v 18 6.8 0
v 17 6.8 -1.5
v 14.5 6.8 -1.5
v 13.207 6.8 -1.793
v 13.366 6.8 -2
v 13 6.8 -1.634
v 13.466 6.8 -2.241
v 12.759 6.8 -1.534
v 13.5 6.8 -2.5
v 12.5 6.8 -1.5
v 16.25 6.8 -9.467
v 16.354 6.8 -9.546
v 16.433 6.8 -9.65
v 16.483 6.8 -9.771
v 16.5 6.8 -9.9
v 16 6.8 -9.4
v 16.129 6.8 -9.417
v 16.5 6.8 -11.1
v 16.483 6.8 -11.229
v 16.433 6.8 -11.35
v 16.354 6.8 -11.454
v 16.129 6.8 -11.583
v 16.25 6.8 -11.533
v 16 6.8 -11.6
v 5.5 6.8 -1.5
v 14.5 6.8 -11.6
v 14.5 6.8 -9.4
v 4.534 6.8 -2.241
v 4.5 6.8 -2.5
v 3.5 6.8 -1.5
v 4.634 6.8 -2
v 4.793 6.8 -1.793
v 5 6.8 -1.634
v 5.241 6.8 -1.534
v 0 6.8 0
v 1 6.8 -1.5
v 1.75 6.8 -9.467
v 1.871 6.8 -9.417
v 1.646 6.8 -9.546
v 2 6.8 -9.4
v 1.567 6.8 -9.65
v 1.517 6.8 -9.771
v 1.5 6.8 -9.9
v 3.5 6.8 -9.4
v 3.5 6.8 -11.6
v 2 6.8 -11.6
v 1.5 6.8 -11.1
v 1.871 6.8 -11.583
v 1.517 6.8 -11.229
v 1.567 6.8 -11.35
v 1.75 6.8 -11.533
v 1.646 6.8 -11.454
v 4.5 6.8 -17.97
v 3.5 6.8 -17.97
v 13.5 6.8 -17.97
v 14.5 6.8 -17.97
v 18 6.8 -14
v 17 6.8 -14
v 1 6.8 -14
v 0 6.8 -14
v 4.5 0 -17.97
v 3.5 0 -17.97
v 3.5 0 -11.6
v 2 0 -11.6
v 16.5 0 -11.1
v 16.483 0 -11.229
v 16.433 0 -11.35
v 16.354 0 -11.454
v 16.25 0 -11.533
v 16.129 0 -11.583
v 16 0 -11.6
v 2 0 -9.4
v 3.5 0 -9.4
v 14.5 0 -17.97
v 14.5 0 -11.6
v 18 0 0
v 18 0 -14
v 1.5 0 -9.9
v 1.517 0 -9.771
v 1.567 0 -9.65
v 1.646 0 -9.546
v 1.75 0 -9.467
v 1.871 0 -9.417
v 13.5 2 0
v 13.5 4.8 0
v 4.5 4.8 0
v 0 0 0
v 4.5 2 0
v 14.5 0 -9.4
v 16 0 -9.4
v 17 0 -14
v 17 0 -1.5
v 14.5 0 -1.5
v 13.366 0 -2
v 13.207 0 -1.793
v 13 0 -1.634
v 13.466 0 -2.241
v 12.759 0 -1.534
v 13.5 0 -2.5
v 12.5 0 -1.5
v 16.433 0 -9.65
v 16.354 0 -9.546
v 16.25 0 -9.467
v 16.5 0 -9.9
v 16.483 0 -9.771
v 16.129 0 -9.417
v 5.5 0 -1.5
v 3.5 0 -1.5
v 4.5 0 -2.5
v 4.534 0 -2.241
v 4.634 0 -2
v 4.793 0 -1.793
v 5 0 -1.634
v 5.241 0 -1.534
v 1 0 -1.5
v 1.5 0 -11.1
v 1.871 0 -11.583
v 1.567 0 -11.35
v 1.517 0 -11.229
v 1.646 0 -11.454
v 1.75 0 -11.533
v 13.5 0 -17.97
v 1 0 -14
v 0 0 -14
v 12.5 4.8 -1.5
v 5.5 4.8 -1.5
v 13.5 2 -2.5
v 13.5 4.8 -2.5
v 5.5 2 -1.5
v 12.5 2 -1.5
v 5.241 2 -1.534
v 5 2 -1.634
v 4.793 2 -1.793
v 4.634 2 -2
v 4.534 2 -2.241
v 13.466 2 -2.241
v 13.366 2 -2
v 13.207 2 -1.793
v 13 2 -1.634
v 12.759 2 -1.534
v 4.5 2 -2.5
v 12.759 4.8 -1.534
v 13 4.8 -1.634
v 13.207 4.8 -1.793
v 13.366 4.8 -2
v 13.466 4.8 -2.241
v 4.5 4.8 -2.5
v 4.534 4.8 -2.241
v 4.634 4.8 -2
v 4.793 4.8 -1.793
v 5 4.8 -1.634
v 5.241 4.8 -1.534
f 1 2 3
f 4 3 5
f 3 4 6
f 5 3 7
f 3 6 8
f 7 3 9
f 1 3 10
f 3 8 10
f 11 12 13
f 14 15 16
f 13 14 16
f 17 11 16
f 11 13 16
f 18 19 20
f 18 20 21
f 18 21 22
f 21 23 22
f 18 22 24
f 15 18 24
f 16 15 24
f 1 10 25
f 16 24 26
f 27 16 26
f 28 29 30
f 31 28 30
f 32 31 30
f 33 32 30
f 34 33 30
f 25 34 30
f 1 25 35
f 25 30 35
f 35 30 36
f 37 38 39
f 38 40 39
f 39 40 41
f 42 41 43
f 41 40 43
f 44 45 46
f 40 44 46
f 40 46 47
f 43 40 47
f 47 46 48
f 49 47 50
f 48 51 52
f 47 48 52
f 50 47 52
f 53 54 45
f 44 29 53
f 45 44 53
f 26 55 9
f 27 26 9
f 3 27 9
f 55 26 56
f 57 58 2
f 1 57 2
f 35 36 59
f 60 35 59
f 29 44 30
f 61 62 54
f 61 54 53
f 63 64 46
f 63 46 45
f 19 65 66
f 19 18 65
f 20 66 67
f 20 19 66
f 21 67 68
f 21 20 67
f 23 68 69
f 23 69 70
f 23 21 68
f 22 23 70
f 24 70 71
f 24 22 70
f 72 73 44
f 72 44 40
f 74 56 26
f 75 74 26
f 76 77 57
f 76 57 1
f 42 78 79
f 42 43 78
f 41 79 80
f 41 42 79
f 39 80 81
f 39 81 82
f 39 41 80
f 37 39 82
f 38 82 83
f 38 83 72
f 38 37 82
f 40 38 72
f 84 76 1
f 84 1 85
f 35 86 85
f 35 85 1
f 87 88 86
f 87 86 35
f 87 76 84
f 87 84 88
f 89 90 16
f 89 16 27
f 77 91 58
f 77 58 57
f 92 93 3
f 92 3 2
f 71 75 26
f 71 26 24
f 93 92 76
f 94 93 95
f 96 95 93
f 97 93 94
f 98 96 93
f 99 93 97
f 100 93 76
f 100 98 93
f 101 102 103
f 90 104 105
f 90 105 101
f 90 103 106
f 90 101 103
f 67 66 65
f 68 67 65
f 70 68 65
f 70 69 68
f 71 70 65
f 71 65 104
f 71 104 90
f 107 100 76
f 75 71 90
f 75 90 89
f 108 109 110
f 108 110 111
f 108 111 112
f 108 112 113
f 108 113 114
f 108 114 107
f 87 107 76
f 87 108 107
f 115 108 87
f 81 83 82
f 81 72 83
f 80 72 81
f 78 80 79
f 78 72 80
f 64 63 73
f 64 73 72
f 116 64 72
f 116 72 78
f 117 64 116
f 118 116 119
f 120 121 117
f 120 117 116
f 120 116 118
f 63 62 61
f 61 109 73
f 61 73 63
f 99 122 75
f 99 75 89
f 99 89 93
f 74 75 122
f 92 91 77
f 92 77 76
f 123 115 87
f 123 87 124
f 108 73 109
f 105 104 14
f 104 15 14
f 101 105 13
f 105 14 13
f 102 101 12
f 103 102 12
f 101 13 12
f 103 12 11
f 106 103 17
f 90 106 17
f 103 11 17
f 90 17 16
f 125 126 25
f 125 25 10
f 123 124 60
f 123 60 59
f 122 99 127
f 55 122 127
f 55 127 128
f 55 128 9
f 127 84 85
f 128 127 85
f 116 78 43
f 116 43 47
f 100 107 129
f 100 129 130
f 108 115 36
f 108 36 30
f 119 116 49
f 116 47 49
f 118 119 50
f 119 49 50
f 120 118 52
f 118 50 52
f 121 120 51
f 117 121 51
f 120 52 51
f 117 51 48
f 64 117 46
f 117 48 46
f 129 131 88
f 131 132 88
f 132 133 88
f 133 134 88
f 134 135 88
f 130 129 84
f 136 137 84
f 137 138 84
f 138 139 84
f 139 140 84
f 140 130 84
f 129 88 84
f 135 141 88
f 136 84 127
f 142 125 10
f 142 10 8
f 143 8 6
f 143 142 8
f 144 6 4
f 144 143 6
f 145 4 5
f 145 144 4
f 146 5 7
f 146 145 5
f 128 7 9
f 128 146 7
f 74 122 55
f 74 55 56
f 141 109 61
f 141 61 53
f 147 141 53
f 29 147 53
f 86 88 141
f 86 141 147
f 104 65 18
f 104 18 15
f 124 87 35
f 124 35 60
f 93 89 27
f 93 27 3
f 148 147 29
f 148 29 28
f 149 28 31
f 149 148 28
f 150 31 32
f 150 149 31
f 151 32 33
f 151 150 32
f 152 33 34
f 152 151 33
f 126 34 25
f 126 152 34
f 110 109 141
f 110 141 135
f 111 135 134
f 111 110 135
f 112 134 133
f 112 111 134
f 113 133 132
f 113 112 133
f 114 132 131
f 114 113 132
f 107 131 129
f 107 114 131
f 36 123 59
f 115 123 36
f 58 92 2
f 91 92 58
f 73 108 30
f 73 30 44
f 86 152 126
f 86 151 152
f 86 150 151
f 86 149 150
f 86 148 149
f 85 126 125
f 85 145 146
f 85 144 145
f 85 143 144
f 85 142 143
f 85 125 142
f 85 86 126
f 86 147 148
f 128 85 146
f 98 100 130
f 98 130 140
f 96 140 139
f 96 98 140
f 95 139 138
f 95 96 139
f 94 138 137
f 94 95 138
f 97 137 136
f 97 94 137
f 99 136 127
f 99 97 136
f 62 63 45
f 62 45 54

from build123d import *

# Parameters (mm, degrees)
SALIENTE_EXTRUIR1_DEPTH = 6.8
CROQUIS2_W              = 9
CROQUIS2_H              = 2.8
CORTAR_EXTRUIR1_DEPTH   = 18.969669092
REDONDEO1_R             = 0.5
REDONDEO2_R             = 0.5
REDONDEO3_R             = 0.5
REDONDEO4_R             = 0.5


with BuildPart() as part:
    # Croquis1 → Saliente-Extruir1 (new body)
    with BuildSketch(Plane(origin=(0, 0, 0), x_dir=(1, 0, 0), z_dir=(0, 1, 0))):
        with BuildLine():
            Line((0, 0), (0, 14))
            Line((0, 14), (1, 14))
            Line((1, 14), (1, 1.5))
            Line((1, 1.5), (3.5, 1.5))
            Line((3.5, 1.5), (3.5, 9.4))
            Line((3.5, 9.4), (1.5, 9.4))
            Line((1.5, 9.4), (1.5, 11.6))
            Line((1.5, 11.6), (3.5, 11.6))
            Line((3.5, 11.6), (3.5, 17.969669092))
            Line((3.5, 17.969669092), (4.5, 17.969669092))
            Line((4.5, 17.969669092), (4.5, 2.5))
            ThreePointArc((4.5, 2.5), (4.792893219, 1.792893219), (5.5, 1.5))
            Line((5.5, 1.5), (12.5, 1.5))
            ThreePointArc((12.5, 1.5), (13.207106781, 1.792893219), (13.5, 2.5))
            Line((13.5, 2.5), (13.5, 17.969669092))
            Line((13.5, 17.969669092), (14.5, 17.969669092))
            Line((14.5, 17.969669092), (14.5, 11.6))
            Line((14.5, 11.6), (16.5, 11.6))
            Line((16.5, 11.6), (16.5, 9.4))
            Line((16.5, 9.4), (14.5, 9.4))
            Line((14.5, 9.4), (14.5, 1.5))
            Line((14.5, 1.5), (17, 1.5))
            Line((17, 1.5), (17, 14))
            Line((17, 14), (18, 14))
            Line((18, 14), (18, 0))
            Line((18, 0), (0, 0))
        make_face()
    extrude(amount=SALIENTE_EXTRUIR1_DEPTH)

    # Croquis2 → Cortar-Extruir1 (cut, through all)
    with BuildSketch(Plane.XY):
        with Locations((9, 3.4)):
            Rectangle(CROQUIS2_W, CROQUIS2_H)
    extrude(amount=-CORTAR_EXTRUIR1_DEPTH, mode=Mode.SUBTRACT)

    # Redondeo1
    redondeo1_edges = [part.edges().sort_by_distance(p)[0] for p in [
        (16.5, 3.4, -11.6),
    ]]
    fillet(redondeo1_edges, radius=REDONDEO1_R)

    # Redondeo2
    redondeo2_edges = [part.edges().sort_by_distance(p)[0] for p in [
        (16.5, 3.4, -9.4),
    ]]
    fillet(redondeo2_edges, radius=REDONDEO2_R)

    # Redondeo3
    redondeo3_edges = [part.edges().sort_by_distance(p)[0] for p in [
        (1.5, 3.4, -9.4),
    ]]
    fillet(redondeo3_edges, radius=REDONDEO3_R)

    # Redondeo4
    redondeo4_edges = [part.edges().sort_by_distance(p)[0] for p in [
        (1.5, 3.4, -11.6),
    ]]
    fillet(redondeo4_edges, radius=REDONDEO4_R)


solid = part.part
